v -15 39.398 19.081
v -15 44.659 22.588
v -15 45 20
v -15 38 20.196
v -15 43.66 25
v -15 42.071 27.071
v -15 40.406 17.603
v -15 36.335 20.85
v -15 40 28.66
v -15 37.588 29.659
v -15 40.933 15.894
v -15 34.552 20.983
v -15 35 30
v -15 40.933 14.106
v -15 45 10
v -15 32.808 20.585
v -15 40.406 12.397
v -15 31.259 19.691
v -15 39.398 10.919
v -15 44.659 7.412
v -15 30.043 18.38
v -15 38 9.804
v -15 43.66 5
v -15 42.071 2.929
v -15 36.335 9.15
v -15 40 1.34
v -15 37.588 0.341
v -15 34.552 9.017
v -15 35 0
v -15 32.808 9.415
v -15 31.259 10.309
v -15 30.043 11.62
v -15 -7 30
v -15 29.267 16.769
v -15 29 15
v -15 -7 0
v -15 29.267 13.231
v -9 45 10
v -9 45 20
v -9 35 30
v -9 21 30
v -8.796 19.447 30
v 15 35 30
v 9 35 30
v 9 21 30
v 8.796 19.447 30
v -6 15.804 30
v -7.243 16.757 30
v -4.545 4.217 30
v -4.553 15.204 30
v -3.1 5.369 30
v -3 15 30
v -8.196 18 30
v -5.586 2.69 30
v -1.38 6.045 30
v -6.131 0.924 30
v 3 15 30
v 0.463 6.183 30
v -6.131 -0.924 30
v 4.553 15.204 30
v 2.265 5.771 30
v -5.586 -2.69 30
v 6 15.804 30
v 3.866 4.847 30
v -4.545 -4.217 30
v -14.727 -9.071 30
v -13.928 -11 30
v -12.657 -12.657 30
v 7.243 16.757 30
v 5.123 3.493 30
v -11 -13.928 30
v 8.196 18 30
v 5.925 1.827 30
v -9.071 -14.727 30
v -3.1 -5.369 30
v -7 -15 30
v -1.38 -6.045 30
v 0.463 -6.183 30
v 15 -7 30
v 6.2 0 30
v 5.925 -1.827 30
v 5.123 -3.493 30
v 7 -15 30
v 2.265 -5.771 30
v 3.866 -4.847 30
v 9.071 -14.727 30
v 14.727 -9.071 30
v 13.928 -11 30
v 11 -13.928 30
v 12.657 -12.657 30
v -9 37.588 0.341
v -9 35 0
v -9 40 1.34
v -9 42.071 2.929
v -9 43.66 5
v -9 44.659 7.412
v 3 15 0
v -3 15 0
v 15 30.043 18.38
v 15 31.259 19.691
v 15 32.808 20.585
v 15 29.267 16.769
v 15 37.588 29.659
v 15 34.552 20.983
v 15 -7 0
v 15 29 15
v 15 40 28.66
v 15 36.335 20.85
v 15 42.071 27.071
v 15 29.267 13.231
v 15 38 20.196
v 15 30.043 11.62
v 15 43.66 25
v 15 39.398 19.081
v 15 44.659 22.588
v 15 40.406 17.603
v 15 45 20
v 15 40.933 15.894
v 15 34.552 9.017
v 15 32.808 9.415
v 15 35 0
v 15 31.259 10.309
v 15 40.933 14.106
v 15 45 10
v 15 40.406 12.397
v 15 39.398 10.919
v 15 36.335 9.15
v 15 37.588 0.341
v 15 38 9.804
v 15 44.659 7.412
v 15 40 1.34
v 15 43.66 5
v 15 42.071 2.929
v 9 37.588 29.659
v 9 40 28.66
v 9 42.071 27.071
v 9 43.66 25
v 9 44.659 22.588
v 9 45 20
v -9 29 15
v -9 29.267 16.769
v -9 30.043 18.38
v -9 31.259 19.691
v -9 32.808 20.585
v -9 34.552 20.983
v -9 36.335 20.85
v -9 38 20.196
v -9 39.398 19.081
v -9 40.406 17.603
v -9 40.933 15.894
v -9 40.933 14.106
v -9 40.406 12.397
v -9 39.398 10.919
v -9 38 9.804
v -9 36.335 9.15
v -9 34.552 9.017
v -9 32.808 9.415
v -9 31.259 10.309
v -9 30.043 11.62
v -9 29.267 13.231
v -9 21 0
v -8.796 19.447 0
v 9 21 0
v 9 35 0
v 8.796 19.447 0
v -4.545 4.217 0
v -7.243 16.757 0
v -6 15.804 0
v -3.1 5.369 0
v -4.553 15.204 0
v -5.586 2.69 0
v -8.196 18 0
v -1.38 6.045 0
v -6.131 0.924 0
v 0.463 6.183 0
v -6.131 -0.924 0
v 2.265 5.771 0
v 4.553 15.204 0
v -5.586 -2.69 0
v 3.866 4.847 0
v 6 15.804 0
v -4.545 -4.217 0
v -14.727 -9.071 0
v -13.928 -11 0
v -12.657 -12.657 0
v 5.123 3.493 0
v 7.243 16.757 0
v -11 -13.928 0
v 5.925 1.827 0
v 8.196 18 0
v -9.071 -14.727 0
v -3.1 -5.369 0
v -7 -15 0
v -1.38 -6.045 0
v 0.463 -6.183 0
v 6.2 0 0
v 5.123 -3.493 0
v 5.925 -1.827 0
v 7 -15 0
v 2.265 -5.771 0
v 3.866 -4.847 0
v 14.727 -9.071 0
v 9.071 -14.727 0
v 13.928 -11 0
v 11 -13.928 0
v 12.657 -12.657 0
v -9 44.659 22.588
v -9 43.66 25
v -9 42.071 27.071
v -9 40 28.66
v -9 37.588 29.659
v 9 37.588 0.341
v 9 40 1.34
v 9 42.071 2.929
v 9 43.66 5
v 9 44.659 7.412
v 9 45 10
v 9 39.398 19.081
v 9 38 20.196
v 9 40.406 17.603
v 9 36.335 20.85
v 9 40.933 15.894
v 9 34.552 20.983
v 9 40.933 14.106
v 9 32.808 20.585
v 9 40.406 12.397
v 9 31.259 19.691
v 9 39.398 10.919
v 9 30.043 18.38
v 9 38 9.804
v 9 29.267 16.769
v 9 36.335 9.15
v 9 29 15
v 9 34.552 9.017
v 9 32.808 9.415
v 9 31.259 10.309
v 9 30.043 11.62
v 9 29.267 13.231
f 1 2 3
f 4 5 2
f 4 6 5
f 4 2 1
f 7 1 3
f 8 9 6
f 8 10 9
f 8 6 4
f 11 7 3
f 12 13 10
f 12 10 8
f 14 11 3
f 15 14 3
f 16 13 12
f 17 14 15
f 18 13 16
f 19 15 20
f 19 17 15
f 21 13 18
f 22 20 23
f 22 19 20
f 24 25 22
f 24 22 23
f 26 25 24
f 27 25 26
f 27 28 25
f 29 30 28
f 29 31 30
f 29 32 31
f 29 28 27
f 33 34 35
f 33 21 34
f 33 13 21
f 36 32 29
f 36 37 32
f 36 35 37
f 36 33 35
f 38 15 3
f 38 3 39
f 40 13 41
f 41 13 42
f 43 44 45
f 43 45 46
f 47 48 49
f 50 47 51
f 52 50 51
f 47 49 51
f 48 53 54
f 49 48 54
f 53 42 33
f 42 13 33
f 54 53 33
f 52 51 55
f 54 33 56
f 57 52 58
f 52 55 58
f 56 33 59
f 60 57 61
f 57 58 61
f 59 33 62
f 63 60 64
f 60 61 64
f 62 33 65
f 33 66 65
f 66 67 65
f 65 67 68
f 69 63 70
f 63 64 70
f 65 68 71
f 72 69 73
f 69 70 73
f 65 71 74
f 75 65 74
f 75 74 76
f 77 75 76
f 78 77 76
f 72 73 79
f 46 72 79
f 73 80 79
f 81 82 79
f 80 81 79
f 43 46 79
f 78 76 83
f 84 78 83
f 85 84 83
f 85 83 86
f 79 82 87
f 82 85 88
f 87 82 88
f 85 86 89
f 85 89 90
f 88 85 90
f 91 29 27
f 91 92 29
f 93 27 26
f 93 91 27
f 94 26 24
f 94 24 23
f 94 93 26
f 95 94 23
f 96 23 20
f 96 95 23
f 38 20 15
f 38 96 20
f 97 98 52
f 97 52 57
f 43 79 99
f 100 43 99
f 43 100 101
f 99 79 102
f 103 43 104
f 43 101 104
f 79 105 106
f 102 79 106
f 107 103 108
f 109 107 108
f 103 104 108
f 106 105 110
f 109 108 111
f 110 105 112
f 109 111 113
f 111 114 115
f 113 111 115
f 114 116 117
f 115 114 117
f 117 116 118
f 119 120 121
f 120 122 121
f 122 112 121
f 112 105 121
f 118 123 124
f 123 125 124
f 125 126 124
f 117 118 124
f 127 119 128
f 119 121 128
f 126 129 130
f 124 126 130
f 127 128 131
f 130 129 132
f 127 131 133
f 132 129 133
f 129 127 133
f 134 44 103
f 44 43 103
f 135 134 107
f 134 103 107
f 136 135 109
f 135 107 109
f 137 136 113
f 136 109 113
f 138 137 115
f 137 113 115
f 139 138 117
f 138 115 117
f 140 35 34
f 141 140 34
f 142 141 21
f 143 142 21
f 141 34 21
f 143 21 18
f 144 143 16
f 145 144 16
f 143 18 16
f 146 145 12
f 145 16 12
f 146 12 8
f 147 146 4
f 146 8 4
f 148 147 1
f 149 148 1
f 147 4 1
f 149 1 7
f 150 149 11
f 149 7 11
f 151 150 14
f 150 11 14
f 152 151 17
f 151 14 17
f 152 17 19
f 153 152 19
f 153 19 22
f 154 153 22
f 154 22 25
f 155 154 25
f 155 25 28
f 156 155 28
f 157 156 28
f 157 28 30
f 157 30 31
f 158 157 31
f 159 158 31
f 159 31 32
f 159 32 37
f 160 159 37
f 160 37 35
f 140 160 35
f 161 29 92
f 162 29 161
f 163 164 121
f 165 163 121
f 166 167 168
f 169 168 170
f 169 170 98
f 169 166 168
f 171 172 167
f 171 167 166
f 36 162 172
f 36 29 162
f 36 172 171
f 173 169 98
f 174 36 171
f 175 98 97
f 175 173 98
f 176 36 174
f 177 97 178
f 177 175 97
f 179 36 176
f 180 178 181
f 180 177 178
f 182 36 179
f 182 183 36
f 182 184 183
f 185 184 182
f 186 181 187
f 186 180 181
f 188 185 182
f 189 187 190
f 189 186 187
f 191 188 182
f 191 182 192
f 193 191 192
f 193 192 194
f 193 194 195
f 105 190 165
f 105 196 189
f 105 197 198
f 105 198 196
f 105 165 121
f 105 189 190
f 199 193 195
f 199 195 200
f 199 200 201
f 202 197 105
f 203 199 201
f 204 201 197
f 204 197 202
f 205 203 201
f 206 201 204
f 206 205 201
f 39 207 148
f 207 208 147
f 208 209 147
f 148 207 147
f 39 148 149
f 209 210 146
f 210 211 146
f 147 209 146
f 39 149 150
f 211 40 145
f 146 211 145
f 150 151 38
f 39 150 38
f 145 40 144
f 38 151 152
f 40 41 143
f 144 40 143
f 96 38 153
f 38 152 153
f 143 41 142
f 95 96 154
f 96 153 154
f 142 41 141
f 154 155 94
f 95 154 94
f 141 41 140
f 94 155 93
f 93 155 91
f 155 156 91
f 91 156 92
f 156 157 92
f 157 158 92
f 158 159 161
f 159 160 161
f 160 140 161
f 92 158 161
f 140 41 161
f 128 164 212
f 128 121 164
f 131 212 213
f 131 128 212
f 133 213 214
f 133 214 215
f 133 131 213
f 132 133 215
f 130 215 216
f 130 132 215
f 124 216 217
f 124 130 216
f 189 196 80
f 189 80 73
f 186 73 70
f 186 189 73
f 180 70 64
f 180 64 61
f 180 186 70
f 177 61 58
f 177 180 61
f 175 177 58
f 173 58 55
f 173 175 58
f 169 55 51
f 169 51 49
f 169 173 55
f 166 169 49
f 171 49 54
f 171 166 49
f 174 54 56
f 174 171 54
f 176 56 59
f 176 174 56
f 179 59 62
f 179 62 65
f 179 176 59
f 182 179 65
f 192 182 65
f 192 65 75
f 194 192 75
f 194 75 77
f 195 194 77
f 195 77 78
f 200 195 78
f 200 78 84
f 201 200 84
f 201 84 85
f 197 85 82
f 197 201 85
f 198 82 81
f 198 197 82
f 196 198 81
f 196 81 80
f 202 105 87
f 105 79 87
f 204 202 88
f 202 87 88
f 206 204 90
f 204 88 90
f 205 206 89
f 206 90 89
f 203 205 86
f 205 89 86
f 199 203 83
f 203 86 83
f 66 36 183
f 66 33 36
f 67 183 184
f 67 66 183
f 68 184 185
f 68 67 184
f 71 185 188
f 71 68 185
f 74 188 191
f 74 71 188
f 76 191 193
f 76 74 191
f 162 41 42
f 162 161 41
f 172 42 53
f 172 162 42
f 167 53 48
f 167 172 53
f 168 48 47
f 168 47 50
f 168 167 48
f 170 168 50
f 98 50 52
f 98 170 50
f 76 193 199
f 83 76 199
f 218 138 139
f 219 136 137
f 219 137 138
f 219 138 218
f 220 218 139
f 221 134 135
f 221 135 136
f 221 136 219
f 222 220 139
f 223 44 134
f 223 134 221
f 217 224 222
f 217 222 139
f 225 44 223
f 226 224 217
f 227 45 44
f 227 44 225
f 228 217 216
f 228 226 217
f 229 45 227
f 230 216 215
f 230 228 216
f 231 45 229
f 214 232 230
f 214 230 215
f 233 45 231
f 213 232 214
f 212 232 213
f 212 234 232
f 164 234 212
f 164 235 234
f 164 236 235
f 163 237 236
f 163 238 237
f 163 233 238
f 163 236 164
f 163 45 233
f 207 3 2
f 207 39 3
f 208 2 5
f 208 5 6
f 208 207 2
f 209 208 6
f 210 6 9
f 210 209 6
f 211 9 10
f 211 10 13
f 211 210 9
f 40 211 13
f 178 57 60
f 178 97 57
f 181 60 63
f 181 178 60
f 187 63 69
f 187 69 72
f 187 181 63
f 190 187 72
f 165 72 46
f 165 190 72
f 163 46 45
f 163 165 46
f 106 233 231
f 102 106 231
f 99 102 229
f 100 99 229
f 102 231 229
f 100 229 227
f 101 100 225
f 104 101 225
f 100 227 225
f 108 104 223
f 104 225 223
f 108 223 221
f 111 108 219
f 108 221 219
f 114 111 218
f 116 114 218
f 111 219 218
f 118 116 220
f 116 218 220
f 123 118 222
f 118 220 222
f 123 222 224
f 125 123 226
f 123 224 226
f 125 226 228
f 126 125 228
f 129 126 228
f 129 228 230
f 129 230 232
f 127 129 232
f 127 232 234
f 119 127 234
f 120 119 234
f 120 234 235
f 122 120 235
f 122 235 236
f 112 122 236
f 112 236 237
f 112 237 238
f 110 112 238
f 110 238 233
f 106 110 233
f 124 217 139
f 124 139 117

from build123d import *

# Parameters (mm, degrees)
SKETCH2_W           = 30
SKETCH2_H           = 30
SKETCH2_R           = 6.2
BOSS_EXTRUDE2_DEPTH = 30
SKETCH4_W           = 6
SKETCH4_H           = 30
BOSS_EXTRUDE3_DEPTH = 30
FILLET1_R           = 8
FILLET4_R           = 10
SKETCH5_R           = 6
CUT_EXTRUDE1_DEPTH  = 30
FILLET5_R           = 6


with BuildPart() as part:
    # Sketch2 → Boss-Extrude2 (new body)
    with BuildSketch(Plane.XY):
        Rectangle(SKETCH2_W, SKETCH2_H)
        Circle(SKETCH2_R, mode=Mode.SUBTRACT)
    extrude(amount=BOSS_EXTRUDE2_DEPTH)

    # Sketch4 → Boss-Extrude3 (add)
    with BuildSketch(Plane(origin=(0, 15, 0), x_dir=(1, 0, 0), z_dir=(0, 1, 0))):
        with Locations((-12, -15)):
            Rectangle(SKETCH4_W, SKETCH4_H)
        with Locations((12, -15)):
            Rectangle(SKETCH4_W, SKETCH4_H)
    extrude(amount=BOSS_EXTRUDE3_DEPTH)

    # Fillet1
    fillet1_edges = [part.edges().sort_by_distance(p)[0] for p in [
        (15, -15, 15),
        (-15, -15, 15),
    ]]
    fillet(fillet1_edges, radius=FILLET1_R)

    # Fillet4
    fillet4_edges = [part.edges().sort_by_distance(p)[0] for p in [
        (-12, 45, 30),
        (-12, 45, 0),
        (12, 45, 30),
        (12, 45, 0),
    ]]
    fillet(fillet4_edges, radius=FILLET4_R)

    # Sketch5 → Cut-Extrude1 (cut)
    with BuildSketch(Plane.ZY.offset(15)):
        with Locations(Location((15, 35, 0), (0, 0, 270))):
            Circle(SKETCH5_R)
    extrude(amount=-CUT_EXTRUDE1_DEPTH, mode=Mode.SUBTRACT)

    # Fillet5
    fillet5_edges = [part.edges().sort_by_distance(p)[0] for p in [
        (-9, 15, 15),
        (9, 15, 15),
    ]]
    fillet(fillet5_edges, radius=FILLET5_R)


solid = part.part
